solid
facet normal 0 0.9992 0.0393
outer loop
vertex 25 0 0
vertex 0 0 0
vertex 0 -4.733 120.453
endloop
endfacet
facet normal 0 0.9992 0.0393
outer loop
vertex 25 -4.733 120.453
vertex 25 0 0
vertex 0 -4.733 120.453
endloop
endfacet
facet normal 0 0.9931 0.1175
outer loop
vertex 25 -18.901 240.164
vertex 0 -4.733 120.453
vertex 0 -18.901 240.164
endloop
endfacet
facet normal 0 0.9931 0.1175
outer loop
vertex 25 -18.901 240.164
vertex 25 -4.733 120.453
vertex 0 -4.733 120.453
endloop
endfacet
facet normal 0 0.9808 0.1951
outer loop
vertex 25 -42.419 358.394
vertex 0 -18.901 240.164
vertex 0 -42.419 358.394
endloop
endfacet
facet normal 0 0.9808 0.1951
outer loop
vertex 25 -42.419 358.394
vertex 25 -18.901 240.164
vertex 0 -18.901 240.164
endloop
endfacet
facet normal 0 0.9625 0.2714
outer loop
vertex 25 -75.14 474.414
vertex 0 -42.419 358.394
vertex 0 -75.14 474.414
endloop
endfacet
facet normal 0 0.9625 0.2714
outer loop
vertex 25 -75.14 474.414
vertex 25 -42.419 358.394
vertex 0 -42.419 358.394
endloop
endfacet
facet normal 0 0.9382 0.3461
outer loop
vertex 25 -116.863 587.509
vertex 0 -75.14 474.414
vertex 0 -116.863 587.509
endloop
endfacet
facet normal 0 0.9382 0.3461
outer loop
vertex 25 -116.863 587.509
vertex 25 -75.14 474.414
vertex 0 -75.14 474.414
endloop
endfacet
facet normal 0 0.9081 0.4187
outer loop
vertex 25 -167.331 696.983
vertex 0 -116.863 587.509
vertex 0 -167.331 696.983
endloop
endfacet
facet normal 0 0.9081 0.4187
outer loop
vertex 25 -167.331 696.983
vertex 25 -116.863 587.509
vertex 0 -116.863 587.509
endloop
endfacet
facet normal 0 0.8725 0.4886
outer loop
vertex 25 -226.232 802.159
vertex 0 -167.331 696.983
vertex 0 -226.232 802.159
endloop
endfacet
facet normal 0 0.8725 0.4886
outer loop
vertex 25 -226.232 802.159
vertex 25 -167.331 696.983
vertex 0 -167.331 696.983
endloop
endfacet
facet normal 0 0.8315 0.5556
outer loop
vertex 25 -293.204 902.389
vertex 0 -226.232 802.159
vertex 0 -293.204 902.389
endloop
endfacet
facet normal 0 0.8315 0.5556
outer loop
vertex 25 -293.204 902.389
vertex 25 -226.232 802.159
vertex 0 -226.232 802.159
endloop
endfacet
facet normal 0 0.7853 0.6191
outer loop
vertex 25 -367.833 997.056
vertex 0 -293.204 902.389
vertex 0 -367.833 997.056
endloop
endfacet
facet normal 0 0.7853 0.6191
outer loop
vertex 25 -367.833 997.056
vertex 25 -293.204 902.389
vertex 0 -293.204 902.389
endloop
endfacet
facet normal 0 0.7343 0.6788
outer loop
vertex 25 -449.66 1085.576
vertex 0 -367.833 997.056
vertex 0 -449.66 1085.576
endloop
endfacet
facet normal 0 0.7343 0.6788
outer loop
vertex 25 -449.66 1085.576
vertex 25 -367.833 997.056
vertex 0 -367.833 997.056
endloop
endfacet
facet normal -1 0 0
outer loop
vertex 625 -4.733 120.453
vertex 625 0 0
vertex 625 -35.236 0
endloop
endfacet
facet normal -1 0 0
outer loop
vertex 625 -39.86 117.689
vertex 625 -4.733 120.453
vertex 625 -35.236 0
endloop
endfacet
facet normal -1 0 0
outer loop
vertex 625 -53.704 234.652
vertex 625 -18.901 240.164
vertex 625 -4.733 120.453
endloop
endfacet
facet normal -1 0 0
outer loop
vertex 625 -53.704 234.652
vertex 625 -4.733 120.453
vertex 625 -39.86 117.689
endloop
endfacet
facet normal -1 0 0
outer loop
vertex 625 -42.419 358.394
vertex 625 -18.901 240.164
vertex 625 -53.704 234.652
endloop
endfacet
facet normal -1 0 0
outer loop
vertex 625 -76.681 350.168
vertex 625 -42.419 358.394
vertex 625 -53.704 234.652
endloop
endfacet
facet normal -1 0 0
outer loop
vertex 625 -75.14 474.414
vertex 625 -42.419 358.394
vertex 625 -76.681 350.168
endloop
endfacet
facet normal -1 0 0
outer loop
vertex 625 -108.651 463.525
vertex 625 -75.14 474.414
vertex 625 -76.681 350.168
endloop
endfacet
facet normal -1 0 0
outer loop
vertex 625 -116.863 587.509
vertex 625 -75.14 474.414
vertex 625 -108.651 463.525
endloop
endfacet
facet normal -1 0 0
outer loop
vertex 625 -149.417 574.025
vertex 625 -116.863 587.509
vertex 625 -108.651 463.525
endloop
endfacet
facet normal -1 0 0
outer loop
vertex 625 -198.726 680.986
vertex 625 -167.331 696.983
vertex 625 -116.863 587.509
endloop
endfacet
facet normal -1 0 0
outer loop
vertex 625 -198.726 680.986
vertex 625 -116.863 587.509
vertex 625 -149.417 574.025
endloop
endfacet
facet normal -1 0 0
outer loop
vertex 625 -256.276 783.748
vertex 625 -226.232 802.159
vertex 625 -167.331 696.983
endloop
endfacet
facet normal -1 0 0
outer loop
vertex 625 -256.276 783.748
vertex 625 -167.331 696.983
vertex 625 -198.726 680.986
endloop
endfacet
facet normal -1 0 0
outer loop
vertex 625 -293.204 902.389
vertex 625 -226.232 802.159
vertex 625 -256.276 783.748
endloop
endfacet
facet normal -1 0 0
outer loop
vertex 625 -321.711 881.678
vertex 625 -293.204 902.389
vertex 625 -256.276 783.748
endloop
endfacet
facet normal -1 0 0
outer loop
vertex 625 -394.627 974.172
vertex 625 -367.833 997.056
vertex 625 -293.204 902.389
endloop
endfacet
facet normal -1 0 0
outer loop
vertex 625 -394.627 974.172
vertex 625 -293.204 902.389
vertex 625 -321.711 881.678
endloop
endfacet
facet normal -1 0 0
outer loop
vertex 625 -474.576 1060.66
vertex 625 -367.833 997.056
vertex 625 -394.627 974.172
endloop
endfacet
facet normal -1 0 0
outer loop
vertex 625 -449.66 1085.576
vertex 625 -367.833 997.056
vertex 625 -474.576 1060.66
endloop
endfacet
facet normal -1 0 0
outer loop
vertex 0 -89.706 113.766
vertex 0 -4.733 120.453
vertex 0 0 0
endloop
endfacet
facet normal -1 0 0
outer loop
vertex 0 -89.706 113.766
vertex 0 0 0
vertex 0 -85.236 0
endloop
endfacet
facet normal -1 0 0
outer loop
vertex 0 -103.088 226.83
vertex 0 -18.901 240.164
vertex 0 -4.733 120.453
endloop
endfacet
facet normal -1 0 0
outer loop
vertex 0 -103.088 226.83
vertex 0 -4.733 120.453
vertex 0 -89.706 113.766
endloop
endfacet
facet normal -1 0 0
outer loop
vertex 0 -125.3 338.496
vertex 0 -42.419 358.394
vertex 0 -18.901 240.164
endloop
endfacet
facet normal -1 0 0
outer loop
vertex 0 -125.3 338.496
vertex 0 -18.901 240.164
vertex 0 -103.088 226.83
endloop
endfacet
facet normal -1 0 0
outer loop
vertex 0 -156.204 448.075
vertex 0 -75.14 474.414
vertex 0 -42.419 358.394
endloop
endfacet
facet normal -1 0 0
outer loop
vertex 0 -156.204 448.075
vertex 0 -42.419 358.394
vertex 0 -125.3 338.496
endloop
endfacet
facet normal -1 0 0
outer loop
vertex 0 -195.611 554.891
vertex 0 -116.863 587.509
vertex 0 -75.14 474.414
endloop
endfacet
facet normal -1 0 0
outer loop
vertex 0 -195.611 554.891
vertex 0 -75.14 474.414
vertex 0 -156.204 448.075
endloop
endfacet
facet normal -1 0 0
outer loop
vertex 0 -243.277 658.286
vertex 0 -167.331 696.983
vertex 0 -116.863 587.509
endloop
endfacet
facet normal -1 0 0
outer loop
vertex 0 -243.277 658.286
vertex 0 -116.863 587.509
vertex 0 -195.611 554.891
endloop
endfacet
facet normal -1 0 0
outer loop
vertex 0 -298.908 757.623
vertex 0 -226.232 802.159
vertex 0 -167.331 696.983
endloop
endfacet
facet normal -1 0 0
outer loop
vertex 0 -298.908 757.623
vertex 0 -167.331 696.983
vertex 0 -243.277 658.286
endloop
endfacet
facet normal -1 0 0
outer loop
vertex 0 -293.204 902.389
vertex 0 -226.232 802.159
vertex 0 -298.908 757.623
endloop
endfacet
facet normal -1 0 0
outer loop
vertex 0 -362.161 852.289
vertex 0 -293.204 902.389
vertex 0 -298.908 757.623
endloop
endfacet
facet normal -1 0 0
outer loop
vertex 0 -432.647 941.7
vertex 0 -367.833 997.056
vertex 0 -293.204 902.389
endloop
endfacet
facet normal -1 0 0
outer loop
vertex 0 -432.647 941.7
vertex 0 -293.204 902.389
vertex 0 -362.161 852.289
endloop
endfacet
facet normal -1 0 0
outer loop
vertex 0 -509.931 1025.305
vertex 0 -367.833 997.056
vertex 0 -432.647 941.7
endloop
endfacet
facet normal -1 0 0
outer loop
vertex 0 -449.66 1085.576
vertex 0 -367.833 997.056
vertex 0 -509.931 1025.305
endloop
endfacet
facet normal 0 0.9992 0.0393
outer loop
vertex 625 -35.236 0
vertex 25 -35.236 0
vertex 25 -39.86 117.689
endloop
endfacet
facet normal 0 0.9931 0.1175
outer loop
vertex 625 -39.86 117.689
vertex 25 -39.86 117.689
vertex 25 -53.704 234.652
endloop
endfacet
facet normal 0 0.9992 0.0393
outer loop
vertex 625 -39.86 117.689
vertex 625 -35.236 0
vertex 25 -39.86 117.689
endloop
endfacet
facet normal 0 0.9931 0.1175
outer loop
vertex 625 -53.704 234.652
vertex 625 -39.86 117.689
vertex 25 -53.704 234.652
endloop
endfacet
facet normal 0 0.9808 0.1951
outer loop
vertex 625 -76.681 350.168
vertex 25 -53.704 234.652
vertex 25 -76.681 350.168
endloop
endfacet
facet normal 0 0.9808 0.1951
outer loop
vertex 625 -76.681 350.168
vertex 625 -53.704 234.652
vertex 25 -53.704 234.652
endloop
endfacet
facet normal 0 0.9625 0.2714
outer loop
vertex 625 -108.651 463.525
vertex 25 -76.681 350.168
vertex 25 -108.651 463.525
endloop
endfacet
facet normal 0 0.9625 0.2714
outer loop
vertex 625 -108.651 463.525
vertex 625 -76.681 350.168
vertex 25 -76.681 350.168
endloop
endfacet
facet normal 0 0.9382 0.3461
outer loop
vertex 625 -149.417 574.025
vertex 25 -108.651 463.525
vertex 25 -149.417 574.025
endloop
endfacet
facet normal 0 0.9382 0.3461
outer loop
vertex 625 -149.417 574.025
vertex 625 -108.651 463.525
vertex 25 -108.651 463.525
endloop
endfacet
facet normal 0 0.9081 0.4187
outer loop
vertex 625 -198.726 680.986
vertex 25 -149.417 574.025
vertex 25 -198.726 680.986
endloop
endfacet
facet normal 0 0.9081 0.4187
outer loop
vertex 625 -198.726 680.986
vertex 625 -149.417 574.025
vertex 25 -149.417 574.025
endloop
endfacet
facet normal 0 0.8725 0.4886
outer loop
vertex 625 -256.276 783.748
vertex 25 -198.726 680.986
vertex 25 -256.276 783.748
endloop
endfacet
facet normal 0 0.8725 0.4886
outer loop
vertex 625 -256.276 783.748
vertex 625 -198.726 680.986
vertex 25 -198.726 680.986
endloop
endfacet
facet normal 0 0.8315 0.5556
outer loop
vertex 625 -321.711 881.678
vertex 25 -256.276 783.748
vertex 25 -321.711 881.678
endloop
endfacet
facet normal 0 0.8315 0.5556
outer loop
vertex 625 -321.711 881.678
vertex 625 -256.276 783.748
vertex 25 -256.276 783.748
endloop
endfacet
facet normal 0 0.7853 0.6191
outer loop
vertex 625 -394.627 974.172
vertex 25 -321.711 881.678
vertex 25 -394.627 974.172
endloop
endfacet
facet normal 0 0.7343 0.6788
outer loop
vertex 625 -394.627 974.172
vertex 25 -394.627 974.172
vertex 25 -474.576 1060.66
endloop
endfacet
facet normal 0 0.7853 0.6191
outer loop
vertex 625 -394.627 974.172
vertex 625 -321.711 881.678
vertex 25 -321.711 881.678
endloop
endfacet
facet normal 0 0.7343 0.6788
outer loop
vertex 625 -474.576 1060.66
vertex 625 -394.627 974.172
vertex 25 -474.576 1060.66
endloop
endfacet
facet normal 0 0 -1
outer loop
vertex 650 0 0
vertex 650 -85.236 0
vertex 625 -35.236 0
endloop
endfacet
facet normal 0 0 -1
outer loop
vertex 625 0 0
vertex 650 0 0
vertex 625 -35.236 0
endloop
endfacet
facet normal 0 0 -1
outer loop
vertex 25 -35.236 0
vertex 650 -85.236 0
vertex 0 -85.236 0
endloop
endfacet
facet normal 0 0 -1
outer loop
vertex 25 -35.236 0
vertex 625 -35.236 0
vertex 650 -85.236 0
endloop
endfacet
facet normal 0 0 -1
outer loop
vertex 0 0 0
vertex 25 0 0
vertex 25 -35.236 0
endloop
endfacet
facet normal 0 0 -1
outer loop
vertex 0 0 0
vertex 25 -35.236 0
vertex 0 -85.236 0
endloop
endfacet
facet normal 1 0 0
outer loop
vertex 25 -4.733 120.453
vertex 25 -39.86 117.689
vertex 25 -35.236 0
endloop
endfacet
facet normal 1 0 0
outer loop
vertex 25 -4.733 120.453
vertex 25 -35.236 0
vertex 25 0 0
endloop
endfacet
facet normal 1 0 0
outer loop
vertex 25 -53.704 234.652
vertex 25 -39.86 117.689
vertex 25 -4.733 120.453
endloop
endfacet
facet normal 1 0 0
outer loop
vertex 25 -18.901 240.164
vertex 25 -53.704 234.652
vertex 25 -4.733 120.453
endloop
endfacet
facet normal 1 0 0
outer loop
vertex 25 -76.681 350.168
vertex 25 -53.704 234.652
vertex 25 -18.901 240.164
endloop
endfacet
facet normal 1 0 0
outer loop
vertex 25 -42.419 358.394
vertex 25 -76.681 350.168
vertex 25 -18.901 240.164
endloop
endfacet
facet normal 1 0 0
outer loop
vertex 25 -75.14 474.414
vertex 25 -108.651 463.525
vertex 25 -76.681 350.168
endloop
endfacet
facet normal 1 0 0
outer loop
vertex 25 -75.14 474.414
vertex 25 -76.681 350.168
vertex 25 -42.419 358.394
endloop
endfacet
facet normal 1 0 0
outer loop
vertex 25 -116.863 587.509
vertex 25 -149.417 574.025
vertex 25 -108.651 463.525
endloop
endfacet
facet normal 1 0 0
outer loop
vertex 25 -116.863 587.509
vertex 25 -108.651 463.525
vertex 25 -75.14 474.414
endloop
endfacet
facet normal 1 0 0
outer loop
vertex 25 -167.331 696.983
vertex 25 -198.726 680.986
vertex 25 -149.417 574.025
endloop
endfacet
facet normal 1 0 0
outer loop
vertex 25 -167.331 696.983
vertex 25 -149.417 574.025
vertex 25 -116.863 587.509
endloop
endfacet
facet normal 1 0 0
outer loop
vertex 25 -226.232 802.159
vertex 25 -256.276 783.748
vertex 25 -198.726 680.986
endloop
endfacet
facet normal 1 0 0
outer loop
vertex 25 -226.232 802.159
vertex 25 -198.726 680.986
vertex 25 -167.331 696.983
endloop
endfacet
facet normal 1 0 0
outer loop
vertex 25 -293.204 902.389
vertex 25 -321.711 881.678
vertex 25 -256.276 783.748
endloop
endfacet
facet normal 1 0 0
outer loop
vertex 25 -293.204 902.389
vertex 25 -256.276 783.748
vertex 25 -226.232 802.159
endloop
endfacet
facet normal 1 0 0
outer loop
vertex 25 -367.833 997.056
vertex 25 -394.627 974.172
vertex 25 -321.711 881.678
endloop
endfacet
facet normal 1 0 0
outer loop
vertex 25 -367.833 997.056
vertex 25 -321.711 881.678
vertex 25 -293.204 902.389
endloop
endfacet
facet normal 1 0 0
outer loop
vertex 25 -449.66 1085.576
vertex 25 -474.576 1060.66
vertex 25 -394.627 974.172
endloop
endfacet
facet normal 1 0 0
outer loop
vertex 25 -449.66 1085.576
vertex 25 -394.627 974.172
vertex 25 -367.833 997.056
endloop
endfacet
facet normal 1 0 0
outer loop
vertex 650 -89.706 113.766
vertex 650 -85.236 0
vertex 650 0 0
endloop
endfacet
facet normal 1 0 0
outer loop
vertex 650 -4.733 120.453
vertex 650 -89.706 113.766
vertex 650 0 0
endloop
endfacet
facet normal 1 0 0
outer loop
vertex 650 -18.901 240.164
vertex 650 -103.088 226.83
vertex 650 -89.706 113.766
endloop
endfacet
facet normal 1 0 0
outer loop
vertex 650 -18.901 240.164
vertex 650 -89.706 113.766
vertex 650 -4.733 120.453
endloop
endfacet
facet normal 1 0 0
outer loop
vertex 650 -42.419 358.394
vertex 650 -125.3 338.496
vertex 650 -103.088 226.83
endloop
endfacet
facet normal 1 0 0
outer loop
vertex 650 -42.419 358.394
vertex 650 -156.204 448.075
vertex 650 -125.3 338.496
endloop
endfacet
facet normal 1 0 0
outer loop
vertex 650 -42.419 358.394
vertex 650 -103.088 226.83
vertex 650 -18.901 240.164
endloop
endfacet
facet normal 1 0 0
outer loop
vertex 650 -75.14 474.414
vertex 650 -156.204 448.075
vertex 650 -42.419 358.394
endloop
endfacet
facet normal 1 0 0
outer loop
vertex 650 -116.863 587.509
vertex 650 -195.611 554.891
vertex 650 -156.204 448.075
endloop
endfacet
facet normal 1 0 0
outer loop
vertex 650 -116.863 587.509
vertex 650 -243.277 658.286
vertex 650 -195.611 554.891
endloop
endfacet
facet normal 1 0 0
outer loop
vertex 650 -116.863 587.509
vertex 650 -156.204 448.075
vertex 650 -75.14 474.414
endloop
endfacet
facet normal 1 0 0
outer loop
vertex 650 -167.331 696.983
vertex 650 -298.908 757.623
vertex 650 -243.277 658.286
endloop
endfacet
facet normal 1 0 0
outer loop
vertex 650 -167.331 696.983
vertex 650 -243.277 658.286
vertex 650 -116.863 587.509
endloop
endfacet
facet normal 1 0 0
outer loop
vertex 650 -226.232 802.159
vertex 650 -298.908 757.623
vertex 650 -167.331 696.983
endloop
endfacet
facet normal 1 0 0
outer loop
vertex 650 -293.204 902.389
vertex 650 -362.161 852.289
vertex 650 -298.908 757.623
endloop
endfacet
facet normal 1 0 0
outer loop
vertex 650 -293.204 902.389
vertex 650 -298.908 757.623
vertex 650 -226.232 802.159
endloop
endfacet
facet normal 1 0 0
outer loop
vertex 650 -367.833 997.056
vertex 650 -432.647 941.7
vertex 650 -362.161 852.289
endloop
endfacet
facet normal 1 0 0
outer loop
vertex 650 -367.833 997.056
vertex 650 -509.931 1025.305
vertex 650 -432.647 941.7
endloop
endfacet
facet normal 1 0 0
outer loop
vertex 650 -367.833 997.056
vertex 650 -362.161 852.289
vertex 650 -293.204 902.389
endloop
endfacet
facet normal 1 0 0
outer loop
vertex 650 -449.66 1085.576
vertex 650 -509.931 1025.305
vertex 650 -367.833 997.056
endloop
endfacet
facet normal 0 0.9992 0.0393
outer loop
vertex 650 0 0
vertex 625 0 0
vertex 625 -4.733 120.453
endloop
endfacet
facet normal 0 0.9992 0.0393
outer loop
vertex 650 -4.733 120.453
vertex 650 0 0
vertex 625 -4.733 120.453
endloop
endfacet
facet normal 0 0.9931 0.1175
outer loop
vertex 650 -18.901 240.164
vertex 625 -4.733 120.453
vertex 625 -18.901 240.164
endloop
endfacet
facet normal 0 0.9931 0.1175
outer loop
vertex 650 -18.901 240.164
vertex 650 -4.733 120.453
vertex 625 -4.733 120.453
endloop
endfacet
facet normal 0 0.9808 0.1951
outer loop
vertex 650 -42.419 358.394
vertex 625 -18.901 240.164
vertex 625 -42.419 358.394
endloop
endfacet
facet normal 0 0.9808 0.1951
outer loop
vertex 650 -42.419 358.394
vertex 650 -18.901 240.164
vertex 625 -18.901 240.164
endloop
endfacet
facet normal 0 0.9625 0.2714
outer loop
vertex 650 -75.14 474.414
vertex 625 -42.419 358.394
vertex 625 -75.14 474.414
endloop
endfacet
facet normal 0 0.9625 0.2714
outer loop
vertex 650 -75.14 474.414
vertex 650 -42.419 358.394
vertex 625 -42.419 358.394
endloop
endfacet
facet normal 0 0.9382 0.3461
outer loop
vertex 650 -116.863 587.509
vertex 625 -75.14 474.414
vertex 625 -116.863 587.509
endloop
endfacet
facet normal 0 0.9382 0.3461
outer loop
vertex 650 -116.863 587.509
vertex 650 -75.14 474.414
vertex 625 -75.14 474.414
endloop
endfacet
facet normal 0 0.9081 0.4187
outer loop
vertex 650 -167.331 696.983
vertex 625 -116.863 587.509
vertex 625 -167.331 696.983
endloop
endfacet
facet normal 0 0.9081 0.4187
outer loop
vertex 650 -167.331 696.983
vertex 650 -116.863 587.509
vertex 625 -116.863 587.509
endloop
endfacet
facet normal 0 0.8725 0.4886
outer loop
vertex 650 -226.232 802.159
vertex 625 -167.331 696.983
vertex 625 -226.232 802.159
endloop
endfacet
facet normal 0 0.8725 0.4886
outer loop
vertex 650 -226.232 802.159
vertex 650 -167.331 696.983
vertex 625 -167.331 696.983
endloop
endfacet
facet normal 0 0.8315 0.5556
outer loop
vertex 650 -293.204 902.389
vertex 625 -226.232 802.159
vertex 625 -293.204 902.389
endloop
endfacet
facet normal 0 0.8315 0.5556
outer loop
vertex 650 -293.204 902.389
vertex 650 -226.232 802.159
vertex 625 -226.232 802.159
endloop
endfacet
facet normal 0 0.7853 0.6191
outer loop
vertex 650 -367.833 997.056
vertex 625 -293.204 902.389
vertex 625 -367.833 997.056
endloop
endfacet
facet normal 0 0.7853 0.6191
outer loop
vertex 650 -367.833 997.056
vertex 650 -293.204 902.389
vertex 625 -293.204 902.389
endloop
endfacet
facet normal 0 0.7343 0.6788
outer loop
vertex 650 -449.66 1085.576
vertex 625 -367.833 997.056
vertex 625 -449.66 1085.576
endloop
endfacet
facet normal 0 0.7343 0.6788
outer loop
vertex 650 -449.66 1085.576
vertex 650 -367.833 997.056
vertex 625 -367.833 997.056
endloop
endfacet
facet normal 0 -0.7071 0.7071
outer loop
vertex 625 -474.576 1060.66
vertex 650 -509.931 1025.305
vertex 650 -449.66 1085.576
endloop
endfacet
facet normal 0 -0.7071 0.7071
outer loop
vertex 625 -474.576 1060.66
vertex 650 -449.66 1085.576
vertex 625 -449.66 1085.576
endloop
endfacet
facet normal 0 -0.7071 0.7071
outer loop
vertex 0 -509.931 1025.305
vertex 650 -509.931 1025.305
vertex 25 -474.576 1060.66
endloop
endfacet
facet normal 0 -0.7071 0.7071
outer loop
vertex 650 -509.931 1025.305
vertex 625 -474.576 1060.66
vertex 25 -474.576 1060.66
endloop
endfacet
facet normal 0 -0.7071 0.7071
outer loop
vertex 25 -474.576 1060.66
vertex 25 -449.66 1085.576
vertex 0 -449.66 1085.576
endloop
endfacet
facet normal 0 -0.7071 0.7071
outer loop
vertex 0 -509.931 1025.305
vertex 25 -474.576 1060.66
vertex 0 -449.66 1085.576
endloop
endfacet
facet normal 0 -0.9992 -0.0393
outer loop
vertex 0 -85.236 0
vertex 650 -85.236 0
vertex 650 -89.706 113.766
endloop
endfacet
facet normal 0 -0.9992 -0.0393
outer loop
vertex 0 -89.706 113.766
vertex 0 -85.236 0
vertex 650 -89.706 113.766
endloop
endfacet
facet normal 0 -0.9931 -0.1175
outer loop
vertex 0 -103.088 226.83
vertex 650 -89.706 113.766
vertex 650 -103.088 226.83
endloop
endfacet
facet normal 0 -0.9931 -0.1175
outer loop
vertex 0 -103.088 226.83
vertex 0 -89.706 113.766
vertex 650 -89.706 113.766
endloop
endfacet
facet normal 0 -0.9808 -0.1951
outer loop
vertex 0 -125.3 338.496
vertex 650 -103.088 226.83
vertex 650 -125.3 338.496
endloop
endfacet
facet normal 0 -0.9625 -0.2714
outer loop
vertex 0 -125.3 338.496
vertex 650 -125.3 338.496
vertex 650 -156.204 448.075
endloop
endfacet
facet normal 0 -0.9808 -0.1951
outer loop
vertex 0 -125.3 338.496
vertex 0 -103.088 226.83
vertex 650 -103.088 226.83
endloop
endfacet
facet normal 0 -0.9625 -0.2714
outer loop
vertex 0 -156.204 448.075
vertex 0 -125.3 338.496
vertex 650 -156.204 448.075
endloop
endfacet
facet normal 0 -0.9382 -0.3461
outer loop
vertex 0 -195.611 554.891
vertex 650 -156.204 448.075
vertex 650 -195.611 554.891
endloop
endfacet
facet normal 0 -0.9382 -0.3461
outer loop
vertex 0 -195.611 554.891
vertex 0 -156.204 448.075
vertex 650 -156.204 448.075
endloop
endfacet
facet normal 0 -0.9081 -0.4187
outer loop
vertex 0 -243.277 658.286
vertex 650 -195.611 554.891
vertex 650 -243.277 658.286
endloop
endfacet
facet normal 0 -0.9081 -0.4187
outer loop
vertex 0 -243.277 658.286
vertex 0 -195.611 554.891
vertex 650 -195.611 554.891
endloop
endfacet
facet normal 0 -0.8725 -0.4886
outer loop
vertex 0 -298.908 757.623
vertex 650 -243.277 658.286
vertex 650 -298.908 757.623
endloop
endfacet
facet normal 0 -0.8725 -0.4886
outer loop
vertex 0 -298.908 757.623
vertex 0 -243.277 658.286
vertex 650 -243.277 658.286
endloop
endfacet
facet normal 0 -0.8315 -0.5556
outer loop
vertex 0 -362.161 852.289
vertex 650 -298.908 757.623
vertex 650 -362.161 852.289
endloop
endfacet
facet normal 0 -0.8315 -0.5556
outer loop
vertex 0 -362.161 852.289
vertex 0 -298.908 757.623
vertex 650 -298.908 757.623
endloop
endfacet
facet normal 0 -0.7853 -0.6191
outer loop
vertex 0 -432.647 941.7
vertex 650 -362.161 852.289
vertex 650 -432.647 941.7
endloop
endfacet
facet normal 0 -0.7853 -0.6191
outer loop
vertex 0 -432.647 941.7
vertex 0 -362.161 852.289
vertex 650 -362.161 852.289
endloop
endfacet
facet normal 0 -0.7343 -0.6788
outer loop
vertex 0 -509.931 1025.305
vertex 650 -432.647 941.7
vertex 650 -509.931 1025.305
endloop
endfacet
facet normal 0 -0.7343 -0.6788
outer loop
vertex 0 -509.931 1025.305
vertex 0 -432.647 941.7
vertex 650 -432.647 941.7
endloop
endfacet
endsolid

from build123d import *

# Parameters (mm, degrees)
REVOLVE2_ANGLE = 45


with BuildPart() as part:
    # Sketch1 → Revolve2 (revolve)
    with BuildSketch(Plane.XY):
        Polygon((0, 0), (25, 0), (25, -35.236081748), (625, -35.236081748), (625, 0), (650, 0), (650, -85.236081748), (0, -85.236081748), align=None)
    revolve(axis=Axis((0, -1535.236081748, 0), (1, 0, 0)), revolution_arc=REVOLVE2_ANGLE)


solid = part.part
